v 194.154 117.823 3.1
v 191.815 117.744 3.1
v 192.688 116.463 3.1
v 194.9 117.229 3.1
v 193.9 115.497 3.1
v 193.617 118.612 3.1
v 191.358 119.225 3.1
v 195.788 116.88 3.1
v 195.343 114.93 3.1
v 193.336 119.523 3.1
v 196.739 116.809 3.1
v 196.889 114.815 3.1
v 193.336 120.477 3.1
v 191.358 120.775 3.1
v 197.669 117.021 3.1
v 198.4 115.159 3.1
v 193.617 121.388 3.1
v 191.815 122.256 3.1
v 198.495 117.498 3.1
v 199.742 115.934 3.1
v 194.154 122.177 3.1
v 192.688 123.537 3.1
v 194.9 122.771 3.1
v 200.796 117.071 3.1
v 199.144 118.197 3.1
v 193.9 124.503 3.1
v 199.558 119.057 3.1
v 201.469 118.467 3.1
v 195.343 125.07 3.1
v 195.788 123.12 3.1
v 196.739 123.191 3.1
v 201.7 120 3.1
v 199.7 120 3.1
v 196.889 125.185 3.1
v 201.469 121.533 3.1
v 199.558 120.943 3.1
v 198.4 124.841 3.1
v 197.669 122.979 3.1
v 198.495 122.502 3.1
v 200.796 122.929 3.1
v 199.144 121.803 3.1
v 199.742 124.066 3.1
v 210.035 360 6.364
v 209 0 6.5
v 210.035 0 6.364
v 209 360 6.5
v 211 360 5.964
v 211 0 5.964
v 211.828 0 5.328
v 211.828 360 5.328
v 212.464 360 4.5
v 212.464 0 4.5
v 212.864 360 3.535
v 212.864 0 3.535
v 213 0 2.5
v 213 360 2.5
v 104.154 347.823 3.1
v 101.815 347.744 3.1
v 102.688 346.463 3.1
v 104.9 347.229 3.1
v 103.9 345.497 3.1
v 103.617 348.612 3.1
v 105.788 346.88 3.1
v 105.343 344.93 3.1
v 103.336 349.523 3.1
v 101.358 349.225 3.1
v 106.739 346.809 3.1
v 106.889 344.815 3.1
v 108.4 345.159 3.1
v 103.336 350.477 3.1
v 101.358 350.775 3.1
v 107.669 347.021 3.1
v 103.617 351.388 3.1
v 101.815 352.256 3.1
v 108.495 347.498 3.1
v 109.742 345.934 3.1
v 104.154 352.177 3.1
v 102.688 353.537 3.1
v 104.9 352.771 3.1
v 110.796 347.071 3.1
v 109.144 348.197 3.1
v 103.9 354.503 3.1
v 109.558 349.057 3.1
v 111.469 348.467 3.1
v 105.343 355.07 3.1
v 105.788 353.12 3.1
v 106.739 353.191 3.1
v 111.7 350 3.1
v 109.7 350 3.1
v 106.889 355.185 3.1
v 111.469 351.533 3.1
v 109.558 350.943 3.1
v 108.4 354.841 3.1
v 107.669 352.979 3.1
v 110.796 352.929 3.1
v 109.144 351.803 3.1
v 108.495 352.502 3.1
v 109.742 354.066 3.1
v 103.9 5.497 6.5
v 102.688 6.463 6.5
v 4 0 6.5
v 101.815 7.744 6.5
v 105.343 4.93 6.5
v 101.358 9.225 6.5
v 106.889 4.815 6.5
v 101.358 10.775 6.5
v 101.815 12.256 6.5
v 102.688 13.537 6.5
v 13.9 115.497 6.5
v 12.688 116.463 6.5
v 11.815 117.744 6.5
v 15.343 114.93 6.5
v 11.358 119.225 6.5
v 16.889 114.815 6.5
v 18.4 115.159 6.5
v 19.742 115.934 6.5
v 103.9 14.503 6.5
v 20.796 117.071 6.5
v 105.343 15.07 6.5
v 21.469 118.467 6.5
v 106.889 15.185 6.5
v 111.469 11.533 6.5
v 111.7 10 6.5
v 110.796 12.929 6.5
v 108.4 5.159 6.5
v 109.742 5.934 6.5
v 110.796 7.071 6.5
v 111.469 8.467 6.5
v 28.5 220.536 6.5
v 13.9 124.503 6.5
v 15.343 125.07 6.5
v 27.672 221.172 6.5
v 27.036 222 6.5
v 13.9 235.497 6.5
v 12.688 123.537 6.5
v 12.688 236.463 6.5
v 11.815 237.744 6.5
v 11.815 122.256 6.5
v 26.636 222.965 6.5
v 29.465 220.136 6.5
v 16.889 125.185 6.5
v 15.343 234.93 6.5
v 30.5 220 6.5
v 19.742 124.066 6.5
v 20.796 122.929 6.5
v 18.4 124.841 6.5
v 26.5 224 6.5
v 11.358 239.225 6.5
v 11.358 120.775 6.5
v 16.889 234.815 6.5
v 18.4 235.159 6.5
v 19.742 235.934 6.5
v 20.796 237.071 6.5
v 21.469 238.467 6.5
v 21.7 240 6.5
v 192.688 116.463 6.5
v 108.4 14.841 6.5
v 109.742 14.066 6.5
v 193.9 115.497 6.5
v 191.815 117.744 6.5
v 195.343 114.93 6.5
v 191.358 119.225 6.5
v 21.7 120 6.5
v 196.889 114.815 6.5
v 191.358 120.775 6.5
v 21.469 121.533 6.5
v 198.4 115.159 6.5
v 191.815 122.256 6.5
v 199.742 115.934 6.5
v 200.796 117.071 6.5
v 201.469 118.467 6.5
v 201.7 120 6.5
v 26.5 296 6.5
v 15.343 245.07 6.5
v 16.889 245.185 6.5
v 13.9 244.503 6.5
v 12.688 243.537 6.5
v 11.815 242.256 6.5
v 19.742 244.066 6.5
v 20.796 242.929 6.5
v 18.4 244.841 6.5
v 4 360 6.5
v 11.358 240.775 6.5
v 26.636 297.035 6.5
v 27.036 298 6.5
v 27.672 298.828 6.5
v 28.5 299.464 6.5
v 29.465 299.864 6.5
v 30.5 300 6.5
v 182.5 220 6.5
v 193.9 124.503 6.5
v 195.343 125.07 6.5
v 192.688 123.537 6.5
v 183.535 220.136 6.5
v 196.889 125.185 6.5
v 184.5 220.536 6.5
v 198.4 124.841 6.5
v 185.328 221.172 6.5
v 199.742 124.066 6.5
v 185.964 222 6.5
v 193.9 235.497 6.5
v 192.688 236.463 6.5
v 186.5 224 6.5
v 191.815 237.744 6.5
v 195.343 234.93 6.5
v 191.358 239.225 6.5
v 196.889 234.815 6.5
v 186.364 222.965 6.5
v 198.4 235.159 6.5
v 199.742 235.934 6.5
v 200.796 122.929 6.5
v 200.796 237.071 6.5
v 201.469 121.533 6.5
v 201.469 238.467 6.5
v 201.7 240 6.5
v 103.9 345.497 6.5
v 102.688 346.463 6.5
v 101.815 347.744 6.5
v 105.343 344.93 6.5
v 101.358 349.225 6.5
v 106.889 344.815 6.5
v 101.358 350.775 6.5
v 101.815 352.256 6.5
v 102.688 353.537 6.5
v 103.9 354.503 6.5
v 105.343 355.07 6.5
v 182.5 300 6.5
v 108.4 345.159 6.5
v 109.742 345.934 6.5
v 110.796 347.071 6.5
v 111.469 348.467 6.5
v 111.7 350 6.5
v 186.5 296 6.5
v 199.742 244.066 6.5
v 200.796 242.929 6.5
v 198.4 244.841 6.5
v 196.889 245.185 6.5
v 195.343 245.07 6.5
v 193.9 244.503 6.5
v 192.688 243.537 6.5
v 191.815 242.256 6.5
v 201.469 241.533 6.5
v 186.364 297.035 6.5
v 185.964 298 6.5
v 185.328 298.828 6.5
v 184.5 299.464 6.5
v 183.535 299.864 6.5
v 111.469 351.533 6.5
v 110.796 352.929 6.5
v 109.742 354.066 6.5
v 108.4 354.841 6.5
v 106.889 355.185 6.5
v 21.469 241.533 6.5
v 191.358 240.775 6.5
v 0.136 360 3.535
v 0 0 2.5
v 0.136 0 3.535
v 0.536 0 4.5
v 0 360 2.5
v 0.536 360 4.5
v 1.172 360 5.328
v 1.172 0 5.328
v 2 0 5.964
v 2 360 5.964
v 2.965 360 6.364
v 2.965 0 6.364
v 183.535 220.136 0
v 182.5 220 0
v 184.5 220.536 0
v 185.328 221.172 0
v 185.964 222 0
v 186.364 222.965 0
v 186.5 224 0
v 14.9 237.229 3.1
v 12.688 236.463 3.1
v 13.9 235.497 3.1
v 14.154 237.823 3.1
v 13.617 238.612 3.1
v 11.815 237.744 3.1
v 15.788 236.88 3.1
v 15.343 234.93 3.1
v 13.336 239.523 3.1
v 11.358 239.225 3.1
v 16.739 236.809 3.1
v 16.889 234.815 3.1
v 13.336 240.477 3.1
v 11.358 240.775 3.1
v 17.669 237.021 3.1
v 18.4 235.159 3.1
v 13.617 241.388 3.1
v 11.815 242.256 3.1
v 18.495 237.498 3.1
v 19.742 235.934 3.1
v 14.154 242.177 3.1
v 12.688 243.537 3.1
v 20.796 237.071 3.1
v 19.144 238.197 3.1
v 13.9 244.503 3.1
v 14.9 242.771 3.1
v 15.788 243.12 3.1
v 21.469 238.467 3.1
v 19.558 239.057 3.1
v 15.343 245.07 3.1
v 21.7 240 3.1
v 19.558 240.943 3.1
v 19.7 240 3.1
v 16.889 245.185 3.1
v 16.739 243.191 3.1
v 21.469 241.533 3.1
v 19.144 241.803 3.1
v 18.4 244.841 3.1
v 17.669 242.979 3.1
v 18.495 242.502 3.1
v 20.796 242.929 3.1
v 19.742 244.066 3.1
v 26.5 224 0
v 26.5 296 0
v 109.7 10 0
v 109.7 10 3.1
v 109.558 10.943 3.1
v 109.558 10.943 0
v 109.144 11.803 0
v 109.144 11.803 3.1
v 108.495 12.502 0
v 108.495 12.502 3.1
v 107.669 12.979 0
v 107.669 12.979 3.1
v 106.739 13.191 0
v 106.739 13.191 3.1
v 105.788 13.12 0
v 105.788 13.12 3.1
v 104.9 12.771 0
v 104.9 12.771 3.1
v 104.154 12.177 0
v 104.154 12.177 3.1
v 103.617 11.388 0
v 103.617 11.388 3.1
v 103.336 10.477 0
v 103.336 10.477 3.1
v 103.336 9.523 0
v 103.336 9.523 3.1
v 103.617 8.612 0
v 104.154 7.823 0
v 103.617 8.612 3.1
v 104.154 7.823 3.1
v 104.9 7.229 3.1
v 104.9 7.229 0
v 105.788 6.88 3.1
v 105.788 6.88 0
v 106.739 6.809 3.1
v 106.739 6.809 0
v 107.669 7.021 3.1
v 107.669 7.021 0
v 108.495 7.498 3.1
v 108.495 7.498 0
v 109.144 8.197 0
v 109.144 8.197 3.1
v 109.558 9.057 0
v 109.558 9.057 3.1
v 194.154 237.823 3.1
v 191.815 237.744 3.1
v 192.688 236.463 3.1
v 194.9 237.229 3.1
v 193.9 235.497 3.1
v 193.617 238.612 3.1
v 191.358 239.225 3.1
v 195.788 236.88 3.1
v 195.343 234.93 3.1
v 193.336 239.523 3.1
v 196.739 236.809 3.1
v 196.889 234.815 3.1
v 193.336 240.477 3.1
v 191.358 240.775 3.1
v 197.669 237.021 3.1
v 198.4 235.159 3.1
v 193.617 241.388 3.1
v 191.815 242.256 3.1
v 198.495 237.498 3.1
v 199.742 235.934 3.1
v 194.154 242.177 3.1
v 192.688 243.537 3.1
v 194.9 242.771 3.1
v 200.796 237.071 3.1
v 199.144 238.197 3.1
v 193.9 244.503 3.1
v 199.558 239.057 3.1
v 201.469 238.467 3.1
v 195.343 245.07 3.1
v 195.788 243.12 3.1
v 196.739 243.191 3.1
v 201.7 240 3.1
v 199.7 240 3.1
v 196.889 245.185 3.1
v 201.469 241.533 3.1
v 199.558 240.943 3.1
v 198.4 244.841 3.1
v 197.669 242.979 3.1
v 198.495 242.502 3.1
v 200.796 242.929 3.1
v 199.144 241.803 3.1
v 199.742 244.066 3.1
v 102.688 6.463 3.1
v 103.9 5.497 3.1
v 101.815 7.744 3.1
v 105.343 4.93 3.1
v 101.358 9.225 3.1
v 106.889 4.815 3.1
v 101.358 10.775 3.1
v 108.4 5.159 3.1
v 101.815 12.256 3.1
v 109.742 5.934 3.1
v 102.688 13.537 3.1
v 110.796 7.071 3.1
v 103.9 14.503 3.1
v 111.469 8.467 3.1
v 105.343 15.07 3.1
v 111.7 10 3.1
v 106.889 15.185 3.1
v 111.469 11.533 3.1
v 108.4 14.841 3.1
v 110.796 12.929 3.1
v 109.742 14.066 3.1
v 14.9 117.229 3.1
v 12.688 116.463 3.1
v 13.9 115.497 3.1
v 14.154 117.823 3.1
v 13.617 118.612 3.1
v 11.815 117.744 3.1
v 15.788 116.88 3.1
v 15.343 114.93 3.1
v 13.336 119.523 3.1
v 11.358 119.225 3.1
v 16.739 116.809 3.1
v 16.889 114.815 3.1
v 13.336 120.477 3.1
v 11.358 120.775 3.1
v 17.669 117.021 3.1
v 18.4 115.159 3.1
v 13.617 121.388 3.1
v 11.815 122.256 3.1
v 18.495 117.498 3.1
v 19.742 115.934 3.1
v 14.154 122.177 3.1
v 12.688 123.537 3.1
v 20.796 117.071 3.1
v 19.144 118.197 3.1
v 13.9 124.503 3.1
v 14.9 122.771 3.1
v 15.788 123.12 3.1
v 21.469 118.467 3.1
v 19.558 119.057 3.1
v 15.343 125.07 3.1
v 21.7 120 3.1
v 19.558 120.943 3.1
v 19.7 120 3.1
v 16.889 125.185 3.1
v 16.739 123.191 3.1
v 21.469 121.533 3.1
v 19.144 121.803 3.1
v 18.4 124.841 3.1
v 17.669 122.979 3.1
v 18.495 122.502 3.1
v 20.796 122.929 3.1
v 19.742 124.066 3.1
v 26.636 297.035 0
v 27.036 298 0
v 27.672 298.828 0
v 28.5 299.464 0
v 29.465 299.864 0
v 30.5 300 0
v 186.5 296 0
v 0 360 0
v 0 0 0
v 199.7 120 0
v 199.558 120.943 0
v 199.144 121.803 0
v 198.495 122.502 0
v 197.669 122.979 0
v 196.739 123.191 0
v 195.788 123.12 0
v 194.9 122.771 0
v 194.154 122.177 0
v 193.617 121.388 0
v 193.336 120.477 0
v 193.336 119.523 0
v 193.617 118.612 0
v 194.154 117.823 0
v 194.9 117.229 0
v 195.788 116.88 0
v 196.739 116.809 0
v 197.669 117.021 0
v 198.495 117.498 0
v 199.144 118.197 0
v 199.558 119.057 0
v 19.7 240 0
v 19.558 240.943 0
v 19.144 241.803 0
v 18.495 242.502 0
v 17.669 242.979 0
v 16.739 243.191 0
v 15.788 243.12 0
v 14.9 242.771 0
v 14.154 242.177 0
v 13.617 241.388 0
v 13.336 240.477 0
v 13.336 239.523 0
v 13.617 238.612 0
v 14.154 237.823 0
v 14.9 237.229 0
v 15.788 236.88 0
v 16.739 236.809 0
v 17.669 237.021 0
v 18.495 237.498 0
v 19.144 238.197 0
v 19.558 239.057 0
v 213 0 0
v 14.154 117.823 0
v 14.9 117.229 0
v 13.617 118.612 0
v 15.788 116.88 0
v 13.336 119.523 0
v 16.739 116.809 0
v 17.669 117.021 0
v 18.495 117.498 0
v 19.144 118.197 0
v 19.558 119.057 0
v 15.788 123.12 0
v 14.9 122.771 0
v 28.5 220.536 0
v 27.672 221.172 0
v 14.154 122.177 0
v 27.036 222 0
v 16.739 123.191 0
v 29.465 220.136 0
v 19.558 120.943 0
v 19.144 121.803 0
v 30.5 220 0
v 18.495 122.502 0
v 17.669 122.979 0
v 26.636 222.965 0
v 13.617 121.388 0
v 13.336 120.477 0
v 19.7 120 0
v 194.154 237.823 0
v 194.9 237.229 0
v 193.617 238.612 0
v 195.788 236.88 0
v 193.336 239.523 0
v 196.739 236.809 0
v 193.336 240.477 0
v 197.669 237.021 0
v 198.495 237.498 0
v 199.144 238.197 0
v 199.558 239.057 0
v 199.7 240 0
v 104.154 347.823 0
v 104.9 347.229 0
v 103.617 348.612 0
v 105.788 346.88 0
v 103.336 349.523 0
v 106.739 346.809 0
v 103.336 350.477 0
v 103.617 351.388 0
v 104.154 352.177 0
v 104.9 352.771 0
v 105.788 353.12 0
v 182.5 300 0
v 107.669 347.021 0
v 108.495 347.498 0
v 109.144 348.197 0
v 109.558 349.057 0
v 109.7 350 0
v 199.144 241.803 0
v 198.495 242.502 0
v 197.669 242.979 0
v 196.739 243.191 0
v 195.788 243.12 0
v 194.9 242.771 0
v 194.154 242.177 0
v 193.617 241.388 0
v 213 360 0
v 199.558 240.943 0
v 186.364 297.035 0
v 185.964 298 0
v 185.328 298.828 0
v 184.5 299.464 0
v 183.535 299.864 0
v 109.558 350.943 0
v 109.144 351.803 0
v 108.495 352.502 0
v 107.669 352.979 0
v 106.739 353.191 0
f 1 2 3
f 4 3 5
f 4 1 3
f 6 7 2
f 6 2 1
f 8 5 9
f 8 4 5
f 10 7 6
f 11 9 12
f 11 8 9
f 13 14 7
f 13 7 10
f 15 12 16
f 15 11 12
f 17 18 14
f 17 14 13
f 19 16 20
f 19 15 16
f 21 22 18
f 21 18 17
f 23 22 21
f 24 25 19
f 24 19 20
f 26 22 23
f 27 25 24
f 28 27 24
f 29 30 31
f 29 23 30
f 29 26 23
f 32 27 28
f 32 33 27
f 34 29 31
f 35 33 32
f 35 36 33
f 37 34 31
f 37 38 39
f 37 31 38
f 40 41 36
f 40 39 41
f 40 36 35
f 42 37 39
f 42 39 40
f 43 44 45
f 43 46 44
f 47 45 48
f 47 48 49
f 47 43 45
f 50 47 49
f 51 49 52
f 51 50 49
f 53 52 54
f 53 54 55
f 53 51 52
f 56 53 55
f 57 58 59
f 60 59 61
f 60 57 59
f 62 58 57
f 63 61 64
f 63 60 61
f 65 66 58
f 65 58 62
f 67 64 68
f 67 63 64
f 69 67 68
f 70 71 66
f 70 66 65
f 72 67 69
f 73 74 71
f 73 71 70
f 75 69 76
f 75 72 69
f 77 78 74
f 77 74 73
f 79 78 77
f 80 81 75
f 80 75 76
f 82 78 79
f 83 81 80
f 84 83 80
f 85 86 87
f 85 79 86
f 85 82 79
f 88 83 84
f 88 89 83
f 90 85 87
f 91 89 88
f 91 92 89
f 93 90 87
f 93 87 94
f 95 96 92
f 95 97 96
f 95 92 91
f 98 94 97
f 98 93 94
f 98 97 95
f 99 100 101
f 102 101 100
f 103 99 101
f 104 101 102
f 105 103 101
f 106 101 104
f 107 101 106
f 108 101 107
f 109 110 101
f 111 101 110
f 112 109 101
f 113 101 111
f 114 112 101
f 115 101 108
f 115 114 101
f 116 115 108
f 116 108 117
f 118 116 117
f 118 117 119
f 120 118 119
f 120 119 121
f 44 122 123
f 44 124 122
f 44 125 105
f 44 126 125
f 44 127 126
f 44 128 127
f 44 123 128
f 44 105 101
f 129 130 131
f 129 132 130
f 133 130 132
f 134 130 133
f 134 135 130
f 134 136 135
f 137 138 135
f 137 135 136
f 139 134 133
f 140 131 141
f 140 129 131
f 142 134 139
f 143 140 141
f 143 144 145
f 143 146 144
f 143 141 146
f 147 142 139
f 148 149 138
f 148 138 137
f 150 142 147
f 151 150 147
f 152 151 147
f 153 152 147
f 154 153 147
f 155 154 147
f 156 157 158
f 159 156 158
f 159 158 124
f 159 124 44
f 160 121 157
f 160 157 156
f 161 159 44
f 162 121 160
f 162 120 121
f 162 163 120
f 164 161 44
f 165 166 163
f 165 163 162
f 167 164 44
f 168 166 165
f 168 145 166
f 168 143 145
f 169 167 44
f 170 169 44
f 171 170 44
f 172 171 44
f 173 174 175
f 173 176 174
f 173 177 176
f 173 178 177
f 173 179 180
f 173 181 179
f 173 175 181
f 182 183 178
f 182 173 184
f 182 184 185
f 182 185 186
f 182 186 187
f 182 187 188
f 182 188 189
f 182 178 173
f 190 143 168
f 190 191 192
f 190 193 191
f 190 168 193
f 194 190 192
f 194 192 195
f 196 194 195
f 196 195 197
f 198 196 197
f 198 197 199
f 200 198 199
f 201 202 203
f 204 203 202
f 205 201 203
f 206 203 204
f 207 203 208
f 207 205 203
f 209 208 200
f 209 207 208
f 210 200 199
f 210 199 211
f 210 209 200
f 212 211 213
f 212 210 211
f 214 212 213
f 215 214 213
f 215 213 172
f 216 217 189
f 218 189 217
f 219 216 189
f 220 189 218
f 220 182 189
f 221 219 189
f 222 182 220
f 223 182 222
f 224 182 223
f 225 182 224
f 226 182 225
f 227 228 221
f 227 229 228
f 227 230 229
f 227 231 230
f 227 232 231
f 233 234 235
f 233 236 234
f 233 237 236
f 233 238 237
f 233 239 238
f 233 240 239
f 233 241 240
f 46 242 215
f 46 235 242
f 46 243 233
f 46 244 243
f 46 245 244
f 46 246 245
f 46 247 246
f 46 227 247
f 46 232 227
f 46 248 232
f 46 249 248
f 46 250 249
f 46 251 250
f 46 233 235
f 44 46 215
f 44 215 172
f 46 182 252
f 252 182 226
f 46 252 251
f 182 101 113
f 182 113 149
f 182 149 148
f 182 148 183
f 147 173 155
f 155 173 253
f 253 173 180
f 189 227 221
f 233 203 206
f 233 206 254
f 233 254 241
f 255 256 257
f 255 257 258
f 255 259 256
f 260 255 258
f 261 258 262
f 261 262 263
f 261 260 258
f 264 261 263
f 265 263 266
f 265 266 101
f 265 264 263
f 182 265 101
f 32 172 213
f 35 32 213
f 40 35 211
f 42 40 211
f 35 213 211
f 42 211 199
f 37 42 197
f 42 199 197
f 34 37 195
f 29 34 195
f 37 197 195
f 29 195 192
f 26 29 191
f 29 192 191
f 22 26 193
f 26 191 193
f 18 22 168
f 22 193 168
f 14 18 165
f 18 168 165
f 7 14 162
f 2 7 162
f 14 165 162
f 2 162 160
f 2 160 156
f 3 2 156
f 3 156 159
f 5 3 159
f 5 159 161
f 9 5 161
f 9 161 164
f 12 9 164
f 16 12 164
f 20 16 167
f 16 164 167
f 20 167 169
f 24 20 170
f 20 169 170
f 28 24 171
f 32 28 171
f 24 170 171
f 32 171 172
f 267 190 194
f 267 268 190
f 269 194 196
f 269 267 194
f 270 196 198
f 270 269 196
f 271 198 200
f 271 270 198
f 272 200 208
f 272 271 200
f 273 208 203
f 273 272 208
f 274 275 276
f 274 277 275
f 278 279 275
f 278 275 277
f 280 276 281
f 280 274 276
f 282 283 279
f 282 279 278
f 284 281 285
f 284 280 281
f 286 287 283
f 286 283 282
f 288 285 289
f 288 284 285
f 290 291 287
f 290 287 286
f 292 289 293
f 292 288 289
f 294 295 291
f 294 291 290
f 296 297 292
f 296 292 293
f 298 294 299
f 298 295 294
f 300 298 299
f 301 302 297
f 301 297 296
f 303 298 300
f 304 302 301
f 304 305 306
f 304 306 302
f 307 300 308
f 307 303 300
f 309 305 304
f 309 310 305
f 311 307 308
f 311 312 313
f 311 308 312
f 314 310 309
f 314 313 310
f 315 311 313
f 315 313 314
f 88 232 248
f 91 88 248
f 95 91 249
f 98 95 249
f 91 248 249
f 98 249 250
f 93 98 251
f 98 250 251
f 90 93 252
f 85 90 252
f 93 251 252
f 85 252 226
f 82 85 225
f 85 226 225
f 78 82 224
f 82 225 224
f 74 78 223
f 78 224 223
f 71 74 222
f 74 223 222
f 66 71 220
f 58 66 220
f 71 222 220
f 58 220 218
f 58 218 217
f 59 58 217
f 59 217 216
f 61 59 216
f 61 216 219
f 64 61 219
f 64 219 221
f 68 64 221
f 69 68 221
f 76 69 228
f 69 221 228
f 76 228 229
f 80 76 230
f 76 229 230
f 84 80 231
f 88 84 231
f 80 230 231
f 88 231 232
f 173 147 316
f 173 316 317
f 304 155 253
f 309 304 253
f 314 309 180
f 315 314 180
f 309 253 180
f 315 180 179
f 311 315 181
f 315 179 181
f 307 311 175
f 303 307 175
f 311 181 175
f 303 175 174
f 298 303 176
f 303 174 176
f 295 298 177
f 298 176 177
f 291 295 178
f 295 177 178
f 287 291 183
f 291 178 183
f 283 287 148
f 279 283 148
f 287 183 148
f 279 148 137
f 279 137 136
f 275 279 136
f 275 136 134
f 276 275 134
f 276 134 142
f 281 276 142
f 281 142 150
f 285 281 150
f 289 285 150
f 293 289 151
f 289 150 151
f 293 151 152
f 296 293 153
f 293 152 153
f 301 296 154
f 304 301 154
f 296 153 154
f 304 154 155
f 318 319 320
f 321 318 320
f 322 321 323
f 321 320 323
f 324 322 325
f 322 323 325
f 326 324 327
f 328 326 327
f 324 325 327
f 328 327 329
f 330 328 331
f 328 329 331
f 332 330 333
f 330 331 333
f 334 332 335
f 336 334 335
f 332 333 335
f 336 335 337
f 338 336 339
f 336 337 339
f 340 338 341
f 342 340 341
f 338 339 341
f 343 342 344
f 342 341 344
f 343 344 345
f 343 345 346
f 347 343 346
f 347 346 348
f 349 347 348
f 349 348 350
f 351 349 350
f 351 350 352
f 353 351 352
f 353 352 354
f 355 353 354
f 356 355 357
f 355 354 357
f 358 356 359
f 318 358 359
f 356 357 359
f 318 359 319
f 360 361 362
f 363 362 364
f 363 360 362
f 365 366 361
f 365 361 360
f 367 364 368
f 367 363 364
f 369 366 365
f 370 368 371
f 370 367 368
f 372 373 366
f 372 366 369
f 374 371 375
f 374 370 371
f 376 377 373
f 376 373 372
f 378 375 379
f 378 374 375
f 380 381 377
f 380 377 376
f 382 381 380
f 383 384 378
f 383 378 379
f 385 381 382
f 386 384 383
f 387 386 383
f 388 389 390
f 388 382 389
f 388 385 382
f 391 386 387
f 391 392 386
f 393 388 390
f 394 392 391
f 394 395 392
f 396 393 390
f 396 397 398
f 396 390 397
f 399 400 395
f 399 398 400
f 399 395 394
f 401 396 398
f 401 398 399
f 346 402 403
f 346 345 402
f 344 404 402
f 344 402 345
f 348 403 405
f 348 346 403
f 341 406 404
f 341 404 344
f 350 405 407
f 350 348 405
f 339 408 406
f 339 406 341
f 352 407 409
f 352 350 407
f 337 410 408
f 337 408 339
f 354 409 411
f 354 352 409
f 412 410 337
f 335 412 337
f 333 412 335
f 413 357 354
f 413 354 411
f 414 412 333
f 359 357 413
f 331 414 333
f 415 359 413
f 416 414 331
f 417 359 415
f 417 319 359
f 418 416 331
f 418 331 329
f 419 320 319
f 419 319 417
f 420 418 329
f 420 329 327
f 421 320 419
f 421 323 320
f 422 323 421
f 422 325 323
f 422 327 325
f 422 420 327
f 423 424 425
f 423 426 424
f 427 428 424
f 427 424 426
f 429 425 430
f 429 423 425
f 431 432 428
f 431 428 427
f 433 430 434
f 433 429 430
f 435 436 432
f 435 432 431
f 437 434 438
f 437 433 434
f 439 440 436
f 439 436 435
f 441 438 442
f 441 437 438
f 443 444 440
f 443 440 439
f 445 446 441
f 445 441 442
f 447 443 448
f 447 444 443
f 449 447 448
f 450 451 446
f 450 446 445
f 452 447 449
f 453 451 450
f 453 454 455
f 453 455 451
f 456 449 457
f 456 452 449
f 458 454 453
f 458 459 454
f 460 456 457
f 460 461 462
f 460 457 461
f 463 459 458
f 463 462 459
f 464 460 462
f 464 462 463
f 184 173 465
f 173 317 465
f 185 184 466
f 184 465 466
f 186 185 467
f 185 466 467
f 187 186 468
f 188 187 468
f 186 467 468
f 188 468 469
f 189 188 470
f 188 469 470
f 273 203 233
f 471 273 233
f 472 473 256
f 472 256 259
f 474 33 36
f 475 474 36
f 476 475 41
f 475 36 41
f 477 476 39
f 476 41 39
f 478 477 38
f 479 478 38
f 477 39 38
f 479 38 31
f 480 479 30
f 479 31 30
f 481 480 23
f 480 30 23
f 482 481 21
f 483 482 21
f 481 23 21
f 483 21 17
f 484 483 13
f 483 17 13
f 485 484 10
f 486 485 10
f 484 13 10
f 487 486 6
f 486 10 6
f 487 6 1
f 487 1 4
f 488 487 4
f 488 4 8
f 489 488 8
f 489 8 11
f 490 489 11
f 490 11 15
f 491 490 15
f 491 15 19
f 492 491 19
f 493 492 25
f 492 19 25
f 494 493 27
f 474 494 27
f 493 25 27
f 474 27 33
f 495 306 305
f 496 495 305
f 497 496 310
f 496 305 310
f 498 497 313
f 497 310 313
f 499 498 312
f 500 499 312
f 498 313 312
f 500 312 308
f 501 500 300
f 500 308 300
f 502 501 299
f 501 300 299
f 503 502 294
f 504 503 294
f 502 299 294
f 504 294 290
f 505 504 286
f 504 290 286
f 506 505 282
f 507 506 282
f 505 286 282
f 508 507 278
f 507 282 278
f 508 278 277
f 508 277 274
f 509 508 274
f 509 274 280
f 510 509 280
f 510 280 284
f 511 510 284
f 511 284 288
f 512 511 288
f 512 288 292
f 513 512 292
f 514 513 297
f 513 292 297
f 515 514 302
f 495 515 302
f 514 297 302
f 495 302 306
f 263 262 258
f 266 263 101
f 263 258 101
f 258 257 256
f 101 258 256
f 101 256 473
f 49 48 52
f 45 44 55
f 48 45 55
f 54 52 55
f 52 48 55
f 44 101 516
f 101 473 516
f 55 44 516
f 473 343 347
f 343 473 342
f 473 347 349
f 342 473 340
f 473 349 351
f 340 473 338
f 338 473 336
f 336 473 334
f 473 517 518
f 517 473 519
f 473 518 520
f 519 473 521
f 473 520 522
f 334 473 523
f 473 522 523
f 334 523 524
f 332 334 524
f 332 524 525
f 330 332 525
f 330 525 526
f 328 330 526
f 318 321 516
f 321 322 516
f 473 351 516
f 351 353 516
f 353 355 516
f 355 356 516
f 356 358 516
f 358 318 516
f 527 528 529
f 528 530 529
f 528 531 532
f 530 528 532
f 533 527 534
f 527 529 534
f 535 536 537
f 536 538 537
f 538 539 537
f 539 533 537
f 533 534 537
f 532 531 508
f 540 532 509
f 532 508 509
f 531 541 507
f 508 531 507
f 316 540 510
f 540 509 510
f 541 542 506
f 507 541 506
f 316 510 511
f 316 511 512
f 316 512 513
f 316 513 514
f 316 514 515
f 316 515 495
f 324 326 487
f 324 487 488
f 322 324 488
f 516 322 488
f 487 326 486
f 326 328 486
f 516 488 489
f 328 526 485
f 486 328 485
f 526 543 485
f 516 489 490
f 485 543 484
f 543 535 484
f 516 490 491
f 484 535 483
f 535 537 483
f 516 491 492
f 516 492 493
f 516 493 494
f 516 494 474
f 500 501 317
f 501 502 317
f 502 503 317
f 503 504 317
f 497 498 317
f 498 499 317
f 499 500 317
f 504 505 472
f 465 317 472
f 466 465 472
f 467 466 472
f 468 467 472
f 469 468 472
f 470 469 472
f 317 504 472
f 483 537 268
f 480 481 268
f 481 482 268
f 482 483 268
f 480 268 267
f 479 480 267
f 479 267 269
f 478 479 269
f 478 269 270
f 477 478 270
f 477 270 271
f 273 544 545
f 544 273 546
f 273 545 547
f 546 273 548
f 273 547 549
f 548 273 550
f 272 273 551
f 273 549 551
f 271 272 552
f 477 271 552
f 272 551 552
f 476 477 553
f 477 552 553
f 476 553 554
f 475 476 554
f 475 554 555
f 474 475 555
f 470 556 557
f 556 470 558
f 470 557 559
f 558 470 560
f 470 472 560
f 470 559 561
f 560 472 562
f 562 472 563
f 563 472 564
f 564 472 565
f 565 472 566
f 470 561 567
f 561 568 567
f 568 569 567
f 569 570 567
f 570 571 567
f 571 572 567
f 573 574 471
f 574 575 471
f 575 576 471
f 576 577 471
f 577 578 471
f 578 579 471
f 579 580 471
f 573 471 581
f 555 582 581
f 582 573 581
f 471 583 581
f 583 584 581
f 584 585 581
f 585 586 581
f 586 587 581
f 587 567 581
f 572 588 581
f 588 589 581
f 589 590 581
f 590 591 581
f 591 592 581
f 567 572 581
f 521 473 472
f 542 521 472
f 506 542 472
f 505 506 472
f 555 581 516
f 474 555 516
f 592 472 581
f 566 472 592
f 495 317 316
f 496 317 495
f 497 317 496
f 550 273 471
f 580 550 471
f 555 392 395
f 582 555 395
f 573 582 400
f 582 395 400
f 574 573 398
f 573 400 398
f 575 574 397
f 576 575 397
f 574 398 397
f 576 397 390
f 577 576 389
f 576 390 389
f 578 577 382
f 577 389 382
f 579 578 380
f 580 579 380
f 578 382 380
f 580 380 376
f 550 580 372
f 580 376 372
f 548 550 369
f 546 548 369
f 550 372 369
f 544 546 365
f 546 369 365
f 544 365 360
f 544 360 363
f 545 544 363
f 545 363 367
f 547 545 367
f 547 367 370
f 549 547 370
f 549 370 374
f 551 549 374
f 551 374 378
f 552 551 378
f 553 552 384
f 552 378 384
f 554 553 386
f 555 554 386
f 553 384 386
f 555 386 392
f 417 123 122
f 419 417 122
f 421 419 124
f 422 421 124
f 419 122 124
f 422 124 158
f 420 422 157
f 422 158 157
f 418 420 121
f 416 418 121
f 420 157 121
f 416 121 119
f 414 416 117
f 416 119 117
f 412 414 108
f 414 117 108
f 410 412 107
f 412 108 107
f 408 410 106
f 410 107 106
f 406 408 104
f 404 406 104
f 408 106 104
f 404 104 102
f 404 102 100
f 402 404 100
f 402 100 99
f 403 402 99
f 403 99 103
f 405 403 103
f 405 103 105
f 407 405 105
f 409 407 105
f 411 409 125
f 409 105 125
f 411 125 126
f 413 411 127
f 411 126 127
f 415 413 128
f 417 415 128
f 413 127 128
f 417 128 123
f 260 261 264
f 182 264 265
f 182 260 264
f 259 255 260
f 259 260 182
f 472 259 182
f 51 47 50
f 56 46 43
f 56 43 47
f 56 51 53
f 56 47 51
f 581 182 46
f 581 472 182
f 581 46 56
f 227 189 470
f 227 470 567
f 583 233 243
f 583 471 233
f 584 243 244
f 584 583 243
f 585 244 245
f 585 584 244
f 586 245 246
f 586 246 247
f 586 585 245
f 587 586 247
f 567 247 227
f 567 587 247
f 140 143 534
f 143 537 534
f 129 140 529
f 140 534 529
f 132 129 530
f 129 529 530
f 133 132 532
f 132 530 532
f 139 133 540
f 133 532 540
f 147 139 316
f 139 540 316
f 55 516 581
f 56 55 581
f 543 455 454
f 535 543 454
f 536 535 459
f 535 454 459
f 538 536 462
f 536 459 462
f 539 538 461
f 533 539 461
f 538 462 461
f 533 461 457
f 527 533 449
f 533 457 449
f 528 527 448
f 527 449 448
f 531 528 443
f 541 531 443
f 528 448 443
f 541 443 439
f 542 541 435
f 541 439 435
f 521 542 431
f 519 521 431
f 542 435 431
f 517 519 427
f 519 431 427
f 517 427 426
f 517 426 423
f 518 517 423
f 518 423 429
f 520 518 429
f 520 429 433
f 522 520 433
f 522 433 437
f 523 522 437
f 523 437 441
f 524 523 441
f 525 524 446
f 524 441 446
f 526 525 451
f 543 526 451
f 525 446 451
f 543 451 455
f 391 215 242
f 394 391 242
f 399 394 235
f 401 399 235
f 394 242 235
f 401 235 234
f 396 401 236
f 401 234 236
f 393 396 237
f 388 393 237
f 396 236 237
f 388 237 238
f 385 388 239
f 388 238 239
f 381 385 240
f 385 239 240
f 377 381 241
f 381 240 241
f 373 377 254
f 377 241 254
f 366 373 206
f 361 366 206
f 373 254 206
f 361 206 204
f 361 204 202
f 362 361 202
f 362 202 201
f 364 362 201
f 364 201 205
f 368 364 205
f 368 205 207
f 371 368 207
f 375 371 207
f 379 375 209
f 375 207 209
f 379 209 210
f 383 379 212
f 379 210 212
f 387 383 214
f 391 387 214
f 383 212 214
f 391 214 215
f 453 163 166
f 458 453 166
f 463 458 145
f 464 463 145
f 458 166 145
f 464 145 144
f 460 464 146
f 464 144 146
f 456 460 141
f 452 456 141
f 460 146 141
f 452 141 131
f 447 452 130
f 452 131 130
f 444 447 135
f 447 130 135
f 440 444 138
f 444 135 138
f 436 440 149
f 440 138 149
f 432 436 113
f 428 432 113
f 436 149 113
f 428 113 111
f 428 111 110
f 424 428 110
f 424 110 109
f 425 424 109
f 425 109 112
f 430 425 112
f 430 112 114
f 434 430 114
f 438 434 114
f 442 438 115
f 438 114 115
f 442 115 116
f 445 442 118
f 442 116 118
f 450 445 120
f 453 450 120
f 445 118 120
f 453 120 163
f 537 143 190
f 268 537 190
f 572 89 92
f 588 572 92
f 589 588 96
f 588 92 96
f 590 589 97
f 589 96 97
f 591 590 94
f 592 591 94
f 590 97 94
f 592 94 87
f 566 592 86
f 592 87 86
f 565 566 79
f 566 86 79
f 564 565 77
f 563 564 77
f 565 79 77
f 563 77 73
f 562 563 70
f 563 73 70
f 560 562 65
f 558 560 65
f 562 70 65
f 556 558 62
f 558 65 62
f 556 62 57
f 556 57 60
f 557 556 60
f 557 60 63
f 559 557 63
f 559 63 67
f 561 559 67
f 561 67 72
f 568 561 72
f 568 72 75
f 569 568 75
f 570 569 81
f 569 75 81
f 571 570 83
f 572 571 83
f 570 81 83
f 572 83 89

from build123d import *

# Parameters (mm, degrees)
SKETCH_W        = 213
SKETCH_H        = 360
PAD_DEPTH       = 6.5
SKETCH001_R     = 5.2
POCKET_DEPTH    = 3.4
SKETCH002_R     = 3.2
POCKET001_DEPTH = 3.1
FILLET_R        = 4
SKETCH003_W     = 160
SKETCH003_H     = 80
POCKET002_DEPTH = 6.5
FILLET001_R     = 4
FILLET002_R     = 4


with BuildPart() as part:
    # Sketch → Pad (new body)
    with BuildSketch(Plane.XY):
        with Locations((106.5, 180)):
            Rectangle(SKETCH_W, SKETCH_H)
    extrude(amount=PAD_DEPTH)

    # Sketch001 (on Face6 of Pad) → Pocket (cut)
    with BuildSketch(Plane.XY.offset(6.5)):
        with Locations((106.5, 350)):
            Circle(SKETCH001_R)
        with Locations((16.5, 240)):
            Circle(SKETCH001_R)
        with Locations((16.5, 120)):
            Circle(SKETCH001_R)
        with Locations((196.5, 240)):
            Circle(SKETCH001_R)
        with Locations((196.5, 120)):
            Circle(SKETCH001_R)
        with Locations((106.5, 10)):
            Circle(SKETCH001_R)
    extrude(amount=-POCKET_DEPTH, mode=Mode.SUBTRACT)

    # Sketch002 (on Face17 of Pocket) → Pocket001 (cut)
    with BuildSketch(Plane.XY.offset(3.1)):
        with Locations((106.5, 350)):
            Circle(SKETCH002_R)
        with Locations((16.5, 240)):
            Circle(SKETCH002_R)
        with Locations((16.5, 120)):
            Circle(SKETCH002_R)
        with Locations((196.5, 240)):
            Circle(SKETCH002_R)
        with Locations((196.5, 120)):
            Circle(SKETCH002_R)
        with Locations((106.5, 10)):
            Circle(SKETCH002_R)
    extrude(amount=-POCKET001_DEPTH, mode=Mode.SUBTRACT)

    # Fillet
    fillet_edges = [part.edges().sort_by_distance(p)[0] for p in [
        (213, 180, 6.5),
        (0, 180, 6.5),
    ]]
    fillet(fillet_edges, radius=FILLET_R)

    # Sketch003 (on Face5 of Fillet) → Pocket002 (cut)
    with BuildSketch(Plane.XY.offset(6.5)):
        with Locations((106.5, 260)):
            Rectangle(SKETCH003_W, SKETCH003_H)
    extrude(amount=-POCKET002_DEPTH, mode=Mode.SUBTRACT)

    # Fillet001
    fillet001_edges = [part.edges().sort_by_distance(p)[0] for p in [
        (26.5, 220, 3.25),
    ]]
    fillet(fillet001_edges, radius=FILLET001_R)

    # Fillet002
    fillet002_edges = [part.edges().sort_by_distance(p)[0] for p in [
        (186.5, 220, 3.25),
        (186.5, 300, 3.25),
        (26.5, 300, 3.25),
    ]]
    fillet(fillet002_edges, radius=FILLET002_R)


solid = part.part
